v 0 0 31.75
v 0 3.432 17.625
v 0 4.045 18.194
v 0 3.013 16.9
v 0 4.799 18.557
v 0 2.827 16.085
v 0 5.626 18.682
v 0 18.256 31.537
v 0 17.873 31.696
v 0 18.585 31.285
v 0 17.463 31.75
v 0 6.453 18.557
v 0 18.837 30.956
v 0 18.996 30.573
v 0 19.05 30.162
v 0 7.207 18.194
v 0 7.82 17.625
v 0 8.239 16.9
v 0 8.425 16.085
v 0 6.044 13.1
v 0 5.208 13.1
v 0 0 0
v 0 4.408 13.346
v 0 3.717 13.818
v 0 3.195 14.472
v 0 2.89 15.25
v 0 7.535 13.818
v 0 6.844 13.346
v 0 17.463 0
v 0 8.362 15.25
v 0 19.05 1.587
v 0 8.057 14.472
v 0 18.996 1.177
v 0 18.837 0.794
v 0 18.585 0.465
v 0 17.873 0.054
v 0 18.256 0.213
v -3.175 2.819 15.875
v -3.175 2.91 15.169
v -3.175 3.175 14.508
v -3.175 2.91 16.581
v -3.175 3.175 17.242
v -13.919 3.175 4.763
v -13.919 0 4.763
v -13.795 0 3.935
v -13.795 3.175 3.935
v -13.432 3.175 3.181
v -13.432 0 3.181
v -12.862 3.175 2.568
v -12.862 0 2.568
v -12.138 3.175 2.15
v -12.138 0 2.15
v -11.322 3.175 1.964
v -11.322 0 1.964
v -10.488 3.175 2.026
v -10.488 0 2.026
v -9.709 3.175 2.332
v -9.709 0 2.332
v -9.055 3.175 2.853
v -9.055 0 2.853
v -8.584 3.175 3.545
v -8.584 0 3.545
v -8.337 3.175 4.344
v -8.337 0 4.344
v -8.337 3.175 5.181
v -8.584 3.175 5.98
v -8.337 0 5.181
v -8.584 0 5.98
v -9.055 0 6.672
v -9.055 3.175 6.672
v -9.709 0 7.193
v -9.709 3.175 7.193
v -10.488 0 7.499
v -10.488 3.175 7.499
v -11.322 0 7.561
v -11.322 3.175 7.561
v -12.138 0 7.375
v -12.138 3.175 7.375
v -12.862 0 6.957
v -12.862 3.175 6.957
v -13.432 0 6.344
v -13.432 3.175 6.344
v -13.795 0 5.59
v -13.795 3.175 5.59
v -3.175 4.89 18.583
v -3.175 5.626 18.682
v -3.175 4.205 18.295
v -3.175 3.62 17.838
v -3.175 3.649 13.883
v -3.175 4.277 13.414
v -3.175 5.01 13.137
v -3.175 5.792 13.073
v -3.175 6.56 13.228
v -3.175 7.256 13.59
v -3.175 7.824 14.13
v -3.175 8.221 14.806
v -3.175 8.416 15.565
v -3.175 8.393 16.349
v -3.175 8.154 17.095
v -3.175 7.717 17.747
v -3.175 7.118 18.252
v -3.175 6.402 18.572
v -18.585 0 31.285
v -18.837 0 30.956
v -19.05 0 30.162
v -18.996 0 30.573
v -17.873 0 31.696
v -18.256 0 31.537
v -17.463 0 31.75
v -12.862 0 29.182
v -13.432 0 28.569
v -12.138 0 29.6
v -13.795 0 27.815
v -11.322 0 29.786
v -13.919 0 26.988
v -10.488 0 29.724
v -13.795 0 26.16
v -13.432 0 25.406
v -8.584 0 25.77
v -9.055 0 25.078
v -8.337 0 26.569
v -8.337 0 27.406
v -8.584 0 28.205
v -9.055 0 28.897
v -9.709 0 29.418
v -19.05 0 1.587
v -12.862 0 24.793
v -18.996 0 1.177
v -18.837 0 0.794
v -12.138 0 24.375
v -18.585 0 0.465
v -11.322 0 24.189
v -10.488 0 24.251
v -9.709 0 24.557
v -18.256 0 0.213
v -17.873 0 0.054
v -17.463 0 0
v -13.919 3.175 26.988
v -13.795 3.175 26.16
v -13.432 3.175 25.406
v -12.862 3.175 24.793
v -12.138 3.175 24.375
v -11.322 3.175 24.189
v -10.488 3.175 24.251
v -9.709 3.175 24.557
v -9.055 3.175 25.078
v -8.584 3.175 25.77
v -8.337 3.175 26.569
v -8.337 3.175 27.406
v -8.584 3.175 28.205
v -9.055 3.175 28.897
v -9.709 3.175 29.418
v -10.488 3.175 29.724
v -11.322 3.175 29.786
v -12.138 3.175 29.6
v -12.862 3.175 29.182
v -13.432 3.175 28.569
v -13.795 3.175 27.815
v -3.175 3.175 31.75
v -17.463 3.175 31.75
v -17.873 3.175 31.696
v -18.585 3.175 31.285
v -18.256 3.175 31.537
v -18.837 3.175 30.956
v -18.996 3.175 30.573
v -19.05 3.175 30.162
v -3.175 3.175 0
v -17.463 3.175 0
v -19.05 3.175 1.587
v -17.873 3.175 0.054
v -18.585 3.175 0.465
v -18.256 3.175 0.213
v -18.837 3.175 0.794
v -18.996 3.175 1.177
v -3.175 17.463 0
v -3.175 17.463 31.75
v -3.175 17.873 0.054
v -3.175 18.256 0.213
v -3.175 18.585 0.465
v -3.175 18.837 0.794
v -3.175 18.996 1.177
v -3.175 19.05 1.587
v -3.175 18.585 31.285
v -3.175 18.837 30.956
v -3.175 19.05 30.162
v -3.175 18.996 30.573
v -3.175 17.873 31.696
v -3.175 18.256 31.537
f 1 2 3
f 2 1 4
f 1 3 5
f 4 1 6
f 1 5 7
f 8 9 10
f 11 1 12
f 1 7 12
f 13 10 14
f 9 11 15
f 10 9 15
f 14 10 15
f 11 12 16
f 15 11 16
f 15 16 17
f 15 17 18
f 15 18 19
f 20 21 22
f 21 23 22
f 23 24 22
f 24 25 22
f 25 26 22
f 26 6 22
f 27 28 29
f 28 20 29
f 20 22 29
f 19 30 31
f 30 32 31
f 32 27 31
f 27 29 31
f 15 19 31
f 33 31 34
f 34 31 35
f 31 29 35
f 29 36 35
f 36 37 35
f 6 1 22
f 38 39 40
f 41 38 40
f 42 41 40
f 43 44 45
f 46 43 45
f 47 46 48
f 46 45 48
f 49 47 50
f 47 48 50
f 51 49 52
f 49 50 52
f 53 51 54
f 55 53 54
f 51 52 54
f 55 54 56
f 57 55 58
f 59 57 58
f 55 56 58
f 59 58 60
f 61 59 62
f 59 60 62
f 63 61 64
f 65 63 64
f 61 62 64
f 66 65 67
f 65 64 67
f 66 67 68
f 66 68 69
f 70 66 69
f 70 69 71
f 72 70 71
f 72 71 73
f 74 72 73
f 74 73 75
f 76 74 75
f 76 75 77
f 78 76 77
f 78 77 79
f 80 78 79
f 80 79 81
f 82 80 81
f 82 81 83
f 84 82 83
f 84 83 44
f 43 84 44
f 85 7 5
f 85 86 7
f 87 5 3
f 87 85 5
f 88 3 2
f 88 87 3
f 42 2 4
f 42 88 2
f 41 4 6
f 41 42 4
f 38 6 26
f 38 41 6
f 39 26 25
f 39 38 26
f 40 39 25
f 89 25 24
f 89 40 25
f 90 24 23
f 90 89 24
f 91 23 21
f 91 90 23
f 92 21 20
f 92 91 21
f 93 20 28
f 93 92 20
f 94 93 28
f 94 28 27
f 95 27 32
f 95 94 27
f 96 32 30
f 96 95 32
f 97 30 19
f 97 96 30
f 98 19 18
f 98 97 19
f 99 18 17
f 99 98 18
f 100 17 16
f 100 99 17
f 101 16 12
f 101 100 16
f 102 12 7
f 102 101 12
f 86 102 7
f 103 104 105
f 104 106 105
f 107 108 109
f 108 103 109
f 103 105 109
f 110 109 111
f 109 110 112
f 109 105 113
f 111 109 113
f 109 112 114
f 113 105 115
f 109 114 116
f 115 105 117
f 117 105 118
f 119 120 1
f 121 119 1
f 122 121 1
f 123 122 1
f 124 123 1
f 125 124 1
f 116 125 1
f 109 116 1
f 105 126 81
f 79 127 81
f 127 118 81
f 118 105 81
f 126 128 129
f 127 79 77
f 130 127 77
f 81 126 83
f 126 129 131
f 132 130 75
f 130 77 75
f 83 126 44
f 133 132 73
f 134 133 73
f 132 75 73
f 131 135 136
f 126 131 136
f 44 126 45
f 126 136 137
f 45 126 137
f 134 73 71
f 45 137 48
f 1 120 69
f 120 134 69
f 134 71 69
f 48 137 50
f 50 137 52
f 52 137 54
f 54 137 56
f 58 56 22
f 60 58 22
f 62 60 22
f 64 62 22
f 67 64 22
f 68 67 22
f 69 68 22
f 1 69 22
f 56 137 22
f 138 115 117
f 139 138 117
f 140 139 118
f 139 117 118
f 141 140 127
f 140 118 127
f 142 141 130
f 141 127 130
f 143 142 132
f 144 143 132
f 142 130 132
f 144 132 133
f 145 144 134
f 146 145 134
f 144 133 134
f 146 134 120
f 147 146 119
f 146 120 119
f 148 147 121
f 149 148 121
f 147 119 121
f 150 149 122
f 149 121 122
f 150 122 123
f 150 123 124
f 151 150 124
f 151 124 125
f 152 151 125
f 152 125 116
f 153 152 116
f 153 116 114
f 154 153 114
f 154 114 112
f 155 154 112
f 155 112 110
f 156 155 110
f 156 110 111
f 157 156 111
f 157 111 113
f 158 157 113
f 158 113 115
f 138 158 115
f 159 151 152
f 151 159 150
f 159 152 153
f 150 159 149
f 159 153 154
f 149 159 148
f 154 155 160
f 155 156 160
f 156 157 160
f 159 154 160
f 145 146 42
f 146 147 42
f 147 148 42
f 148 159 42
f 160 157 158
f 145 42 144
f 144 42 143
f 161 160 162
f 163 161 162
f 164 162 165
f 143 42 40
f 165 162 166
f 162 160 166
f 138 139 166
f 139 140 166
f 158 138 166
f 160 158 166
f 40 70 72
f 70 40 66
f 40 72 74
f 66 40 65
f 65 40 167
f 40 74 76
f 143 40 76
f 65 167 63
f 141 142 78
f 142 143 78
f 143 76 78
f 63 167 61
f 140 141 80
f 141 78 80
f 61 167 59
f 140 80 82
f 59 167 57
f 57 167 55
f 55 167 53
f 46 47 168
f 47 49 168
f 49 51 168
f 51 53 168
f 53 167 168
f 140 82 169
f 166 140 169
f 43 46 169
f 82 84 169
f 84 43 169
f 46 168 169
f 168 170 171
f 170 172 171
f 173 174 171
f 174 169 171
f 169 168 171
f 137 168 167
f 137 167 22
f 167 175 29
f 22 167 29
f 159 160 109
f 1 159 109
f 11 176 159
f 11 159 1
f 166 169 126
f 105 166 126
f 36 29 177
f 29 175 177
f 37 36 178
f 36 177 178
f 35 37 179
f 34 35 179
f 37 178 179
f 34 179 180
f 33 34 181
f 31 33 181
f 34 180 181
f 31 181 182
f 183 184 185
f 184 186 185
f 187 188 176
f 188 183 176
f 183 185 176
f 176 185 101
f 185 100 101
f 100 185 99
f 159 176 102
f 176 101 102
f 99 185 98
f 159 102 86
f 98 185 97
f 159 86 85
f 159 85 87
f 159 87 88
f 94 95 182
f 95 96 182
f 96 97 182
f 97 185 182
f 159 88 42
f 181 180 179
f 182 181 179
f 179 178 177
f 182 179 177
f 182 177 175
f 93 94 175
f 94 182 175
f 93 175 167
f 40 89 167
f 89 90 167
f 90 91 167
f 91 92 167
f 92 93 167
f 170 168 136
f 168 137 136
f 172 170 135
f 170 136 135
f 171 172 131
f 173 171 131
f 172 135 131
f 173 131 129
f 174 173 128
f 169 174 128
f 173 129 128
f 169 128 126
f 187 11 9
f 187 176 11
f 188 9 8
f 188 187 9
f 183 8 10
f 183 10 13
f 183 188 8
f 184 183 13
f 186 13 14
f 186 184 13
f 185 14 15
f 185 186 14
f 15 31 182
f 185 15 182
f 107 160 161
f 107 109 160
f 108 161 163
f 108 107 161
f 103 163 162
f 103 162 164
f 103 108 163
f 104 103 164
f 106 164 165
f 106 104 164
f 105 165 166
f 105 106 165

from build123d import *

# Parameters (mm, degrees)
BOSS_EXTRUDE1_DEPTH        = 31.75
F_10_CLEARANCE_HOLE1_D     = 5.6134
F_10_CLEARANCE_HOLE1_DEPTH = 25.4
F_10_CLEARANCE_HOLE1_TIP   = 1.686435499
FILLET1_R                  = 1.5875


with BuildPart() as part:
    # Sketch1 → Boss-Extrude1 (new body)
    with BuildSketch(Plane.XY):
        Polygon((0, 0), (0, 19.05), (-3.175, 19.05), (-3.175, 3.175), (-19.05, 3.175), (-19.05, 0), align=None)
    extrude(amount=BOSS_EXTRUDE1_DEPTH)

    # #10 Clearance Hole1
    with Locations(Plane(origin=(0, 3.175, 0), x_dir=(1, 0, 0), z_dir=(0, 1, 0))):
        with Locations((-11.1125, -26.9875), (-11.1125, -4.7625)):
            Hole(F_10_CLEARANCE_HOLE1_D / 2, depth=F_10_CLEARANCE_HOLE1_DEPTH)
            with Locations((0, 0, -(F_10_CLEARANCE_HOLE1_DEPTH + F_10_CLEARANCE_HOLE1_TIP / 2))):  # 118° drill point
                Cone(0, F_10_CLEARANCE_HOLE1_D / 2, F_10_CLEARANCE_HOLE1_TIP, mode=Mode.SUBTRACT)

    # Sketch5 → #10 Clearance Hole2 (revolve, cut)
    with BuildSketch(Plane(origin=(-3.175, 5.6261, 15.875), x_dir=(0, 0, 1), z_dir=(0, 1, 0))):
        Polygon((0, 0), (0, 27.086435499), (2.8067, 25.4), (2.8067, 0), align=None)
    revolve(axis=Axis((-9.525, 5.6261, 15.875), (1, 0, 0)), mode=Mode.SUBTRACT)

    # Fillet1
    fillet1_edges = [part.edges().sort_by_distance(p)[0] for p in [
        (-1.5875, 19.05, 31.75),
        (-19.05, 1.5875, 31.75),
        (-19.05, 1.5875, 0),
        (-1.5875, 19.05, 0),
    ]]
    fillet(fillet1_edges, radius=FILLET1_R)


solid = part.part
